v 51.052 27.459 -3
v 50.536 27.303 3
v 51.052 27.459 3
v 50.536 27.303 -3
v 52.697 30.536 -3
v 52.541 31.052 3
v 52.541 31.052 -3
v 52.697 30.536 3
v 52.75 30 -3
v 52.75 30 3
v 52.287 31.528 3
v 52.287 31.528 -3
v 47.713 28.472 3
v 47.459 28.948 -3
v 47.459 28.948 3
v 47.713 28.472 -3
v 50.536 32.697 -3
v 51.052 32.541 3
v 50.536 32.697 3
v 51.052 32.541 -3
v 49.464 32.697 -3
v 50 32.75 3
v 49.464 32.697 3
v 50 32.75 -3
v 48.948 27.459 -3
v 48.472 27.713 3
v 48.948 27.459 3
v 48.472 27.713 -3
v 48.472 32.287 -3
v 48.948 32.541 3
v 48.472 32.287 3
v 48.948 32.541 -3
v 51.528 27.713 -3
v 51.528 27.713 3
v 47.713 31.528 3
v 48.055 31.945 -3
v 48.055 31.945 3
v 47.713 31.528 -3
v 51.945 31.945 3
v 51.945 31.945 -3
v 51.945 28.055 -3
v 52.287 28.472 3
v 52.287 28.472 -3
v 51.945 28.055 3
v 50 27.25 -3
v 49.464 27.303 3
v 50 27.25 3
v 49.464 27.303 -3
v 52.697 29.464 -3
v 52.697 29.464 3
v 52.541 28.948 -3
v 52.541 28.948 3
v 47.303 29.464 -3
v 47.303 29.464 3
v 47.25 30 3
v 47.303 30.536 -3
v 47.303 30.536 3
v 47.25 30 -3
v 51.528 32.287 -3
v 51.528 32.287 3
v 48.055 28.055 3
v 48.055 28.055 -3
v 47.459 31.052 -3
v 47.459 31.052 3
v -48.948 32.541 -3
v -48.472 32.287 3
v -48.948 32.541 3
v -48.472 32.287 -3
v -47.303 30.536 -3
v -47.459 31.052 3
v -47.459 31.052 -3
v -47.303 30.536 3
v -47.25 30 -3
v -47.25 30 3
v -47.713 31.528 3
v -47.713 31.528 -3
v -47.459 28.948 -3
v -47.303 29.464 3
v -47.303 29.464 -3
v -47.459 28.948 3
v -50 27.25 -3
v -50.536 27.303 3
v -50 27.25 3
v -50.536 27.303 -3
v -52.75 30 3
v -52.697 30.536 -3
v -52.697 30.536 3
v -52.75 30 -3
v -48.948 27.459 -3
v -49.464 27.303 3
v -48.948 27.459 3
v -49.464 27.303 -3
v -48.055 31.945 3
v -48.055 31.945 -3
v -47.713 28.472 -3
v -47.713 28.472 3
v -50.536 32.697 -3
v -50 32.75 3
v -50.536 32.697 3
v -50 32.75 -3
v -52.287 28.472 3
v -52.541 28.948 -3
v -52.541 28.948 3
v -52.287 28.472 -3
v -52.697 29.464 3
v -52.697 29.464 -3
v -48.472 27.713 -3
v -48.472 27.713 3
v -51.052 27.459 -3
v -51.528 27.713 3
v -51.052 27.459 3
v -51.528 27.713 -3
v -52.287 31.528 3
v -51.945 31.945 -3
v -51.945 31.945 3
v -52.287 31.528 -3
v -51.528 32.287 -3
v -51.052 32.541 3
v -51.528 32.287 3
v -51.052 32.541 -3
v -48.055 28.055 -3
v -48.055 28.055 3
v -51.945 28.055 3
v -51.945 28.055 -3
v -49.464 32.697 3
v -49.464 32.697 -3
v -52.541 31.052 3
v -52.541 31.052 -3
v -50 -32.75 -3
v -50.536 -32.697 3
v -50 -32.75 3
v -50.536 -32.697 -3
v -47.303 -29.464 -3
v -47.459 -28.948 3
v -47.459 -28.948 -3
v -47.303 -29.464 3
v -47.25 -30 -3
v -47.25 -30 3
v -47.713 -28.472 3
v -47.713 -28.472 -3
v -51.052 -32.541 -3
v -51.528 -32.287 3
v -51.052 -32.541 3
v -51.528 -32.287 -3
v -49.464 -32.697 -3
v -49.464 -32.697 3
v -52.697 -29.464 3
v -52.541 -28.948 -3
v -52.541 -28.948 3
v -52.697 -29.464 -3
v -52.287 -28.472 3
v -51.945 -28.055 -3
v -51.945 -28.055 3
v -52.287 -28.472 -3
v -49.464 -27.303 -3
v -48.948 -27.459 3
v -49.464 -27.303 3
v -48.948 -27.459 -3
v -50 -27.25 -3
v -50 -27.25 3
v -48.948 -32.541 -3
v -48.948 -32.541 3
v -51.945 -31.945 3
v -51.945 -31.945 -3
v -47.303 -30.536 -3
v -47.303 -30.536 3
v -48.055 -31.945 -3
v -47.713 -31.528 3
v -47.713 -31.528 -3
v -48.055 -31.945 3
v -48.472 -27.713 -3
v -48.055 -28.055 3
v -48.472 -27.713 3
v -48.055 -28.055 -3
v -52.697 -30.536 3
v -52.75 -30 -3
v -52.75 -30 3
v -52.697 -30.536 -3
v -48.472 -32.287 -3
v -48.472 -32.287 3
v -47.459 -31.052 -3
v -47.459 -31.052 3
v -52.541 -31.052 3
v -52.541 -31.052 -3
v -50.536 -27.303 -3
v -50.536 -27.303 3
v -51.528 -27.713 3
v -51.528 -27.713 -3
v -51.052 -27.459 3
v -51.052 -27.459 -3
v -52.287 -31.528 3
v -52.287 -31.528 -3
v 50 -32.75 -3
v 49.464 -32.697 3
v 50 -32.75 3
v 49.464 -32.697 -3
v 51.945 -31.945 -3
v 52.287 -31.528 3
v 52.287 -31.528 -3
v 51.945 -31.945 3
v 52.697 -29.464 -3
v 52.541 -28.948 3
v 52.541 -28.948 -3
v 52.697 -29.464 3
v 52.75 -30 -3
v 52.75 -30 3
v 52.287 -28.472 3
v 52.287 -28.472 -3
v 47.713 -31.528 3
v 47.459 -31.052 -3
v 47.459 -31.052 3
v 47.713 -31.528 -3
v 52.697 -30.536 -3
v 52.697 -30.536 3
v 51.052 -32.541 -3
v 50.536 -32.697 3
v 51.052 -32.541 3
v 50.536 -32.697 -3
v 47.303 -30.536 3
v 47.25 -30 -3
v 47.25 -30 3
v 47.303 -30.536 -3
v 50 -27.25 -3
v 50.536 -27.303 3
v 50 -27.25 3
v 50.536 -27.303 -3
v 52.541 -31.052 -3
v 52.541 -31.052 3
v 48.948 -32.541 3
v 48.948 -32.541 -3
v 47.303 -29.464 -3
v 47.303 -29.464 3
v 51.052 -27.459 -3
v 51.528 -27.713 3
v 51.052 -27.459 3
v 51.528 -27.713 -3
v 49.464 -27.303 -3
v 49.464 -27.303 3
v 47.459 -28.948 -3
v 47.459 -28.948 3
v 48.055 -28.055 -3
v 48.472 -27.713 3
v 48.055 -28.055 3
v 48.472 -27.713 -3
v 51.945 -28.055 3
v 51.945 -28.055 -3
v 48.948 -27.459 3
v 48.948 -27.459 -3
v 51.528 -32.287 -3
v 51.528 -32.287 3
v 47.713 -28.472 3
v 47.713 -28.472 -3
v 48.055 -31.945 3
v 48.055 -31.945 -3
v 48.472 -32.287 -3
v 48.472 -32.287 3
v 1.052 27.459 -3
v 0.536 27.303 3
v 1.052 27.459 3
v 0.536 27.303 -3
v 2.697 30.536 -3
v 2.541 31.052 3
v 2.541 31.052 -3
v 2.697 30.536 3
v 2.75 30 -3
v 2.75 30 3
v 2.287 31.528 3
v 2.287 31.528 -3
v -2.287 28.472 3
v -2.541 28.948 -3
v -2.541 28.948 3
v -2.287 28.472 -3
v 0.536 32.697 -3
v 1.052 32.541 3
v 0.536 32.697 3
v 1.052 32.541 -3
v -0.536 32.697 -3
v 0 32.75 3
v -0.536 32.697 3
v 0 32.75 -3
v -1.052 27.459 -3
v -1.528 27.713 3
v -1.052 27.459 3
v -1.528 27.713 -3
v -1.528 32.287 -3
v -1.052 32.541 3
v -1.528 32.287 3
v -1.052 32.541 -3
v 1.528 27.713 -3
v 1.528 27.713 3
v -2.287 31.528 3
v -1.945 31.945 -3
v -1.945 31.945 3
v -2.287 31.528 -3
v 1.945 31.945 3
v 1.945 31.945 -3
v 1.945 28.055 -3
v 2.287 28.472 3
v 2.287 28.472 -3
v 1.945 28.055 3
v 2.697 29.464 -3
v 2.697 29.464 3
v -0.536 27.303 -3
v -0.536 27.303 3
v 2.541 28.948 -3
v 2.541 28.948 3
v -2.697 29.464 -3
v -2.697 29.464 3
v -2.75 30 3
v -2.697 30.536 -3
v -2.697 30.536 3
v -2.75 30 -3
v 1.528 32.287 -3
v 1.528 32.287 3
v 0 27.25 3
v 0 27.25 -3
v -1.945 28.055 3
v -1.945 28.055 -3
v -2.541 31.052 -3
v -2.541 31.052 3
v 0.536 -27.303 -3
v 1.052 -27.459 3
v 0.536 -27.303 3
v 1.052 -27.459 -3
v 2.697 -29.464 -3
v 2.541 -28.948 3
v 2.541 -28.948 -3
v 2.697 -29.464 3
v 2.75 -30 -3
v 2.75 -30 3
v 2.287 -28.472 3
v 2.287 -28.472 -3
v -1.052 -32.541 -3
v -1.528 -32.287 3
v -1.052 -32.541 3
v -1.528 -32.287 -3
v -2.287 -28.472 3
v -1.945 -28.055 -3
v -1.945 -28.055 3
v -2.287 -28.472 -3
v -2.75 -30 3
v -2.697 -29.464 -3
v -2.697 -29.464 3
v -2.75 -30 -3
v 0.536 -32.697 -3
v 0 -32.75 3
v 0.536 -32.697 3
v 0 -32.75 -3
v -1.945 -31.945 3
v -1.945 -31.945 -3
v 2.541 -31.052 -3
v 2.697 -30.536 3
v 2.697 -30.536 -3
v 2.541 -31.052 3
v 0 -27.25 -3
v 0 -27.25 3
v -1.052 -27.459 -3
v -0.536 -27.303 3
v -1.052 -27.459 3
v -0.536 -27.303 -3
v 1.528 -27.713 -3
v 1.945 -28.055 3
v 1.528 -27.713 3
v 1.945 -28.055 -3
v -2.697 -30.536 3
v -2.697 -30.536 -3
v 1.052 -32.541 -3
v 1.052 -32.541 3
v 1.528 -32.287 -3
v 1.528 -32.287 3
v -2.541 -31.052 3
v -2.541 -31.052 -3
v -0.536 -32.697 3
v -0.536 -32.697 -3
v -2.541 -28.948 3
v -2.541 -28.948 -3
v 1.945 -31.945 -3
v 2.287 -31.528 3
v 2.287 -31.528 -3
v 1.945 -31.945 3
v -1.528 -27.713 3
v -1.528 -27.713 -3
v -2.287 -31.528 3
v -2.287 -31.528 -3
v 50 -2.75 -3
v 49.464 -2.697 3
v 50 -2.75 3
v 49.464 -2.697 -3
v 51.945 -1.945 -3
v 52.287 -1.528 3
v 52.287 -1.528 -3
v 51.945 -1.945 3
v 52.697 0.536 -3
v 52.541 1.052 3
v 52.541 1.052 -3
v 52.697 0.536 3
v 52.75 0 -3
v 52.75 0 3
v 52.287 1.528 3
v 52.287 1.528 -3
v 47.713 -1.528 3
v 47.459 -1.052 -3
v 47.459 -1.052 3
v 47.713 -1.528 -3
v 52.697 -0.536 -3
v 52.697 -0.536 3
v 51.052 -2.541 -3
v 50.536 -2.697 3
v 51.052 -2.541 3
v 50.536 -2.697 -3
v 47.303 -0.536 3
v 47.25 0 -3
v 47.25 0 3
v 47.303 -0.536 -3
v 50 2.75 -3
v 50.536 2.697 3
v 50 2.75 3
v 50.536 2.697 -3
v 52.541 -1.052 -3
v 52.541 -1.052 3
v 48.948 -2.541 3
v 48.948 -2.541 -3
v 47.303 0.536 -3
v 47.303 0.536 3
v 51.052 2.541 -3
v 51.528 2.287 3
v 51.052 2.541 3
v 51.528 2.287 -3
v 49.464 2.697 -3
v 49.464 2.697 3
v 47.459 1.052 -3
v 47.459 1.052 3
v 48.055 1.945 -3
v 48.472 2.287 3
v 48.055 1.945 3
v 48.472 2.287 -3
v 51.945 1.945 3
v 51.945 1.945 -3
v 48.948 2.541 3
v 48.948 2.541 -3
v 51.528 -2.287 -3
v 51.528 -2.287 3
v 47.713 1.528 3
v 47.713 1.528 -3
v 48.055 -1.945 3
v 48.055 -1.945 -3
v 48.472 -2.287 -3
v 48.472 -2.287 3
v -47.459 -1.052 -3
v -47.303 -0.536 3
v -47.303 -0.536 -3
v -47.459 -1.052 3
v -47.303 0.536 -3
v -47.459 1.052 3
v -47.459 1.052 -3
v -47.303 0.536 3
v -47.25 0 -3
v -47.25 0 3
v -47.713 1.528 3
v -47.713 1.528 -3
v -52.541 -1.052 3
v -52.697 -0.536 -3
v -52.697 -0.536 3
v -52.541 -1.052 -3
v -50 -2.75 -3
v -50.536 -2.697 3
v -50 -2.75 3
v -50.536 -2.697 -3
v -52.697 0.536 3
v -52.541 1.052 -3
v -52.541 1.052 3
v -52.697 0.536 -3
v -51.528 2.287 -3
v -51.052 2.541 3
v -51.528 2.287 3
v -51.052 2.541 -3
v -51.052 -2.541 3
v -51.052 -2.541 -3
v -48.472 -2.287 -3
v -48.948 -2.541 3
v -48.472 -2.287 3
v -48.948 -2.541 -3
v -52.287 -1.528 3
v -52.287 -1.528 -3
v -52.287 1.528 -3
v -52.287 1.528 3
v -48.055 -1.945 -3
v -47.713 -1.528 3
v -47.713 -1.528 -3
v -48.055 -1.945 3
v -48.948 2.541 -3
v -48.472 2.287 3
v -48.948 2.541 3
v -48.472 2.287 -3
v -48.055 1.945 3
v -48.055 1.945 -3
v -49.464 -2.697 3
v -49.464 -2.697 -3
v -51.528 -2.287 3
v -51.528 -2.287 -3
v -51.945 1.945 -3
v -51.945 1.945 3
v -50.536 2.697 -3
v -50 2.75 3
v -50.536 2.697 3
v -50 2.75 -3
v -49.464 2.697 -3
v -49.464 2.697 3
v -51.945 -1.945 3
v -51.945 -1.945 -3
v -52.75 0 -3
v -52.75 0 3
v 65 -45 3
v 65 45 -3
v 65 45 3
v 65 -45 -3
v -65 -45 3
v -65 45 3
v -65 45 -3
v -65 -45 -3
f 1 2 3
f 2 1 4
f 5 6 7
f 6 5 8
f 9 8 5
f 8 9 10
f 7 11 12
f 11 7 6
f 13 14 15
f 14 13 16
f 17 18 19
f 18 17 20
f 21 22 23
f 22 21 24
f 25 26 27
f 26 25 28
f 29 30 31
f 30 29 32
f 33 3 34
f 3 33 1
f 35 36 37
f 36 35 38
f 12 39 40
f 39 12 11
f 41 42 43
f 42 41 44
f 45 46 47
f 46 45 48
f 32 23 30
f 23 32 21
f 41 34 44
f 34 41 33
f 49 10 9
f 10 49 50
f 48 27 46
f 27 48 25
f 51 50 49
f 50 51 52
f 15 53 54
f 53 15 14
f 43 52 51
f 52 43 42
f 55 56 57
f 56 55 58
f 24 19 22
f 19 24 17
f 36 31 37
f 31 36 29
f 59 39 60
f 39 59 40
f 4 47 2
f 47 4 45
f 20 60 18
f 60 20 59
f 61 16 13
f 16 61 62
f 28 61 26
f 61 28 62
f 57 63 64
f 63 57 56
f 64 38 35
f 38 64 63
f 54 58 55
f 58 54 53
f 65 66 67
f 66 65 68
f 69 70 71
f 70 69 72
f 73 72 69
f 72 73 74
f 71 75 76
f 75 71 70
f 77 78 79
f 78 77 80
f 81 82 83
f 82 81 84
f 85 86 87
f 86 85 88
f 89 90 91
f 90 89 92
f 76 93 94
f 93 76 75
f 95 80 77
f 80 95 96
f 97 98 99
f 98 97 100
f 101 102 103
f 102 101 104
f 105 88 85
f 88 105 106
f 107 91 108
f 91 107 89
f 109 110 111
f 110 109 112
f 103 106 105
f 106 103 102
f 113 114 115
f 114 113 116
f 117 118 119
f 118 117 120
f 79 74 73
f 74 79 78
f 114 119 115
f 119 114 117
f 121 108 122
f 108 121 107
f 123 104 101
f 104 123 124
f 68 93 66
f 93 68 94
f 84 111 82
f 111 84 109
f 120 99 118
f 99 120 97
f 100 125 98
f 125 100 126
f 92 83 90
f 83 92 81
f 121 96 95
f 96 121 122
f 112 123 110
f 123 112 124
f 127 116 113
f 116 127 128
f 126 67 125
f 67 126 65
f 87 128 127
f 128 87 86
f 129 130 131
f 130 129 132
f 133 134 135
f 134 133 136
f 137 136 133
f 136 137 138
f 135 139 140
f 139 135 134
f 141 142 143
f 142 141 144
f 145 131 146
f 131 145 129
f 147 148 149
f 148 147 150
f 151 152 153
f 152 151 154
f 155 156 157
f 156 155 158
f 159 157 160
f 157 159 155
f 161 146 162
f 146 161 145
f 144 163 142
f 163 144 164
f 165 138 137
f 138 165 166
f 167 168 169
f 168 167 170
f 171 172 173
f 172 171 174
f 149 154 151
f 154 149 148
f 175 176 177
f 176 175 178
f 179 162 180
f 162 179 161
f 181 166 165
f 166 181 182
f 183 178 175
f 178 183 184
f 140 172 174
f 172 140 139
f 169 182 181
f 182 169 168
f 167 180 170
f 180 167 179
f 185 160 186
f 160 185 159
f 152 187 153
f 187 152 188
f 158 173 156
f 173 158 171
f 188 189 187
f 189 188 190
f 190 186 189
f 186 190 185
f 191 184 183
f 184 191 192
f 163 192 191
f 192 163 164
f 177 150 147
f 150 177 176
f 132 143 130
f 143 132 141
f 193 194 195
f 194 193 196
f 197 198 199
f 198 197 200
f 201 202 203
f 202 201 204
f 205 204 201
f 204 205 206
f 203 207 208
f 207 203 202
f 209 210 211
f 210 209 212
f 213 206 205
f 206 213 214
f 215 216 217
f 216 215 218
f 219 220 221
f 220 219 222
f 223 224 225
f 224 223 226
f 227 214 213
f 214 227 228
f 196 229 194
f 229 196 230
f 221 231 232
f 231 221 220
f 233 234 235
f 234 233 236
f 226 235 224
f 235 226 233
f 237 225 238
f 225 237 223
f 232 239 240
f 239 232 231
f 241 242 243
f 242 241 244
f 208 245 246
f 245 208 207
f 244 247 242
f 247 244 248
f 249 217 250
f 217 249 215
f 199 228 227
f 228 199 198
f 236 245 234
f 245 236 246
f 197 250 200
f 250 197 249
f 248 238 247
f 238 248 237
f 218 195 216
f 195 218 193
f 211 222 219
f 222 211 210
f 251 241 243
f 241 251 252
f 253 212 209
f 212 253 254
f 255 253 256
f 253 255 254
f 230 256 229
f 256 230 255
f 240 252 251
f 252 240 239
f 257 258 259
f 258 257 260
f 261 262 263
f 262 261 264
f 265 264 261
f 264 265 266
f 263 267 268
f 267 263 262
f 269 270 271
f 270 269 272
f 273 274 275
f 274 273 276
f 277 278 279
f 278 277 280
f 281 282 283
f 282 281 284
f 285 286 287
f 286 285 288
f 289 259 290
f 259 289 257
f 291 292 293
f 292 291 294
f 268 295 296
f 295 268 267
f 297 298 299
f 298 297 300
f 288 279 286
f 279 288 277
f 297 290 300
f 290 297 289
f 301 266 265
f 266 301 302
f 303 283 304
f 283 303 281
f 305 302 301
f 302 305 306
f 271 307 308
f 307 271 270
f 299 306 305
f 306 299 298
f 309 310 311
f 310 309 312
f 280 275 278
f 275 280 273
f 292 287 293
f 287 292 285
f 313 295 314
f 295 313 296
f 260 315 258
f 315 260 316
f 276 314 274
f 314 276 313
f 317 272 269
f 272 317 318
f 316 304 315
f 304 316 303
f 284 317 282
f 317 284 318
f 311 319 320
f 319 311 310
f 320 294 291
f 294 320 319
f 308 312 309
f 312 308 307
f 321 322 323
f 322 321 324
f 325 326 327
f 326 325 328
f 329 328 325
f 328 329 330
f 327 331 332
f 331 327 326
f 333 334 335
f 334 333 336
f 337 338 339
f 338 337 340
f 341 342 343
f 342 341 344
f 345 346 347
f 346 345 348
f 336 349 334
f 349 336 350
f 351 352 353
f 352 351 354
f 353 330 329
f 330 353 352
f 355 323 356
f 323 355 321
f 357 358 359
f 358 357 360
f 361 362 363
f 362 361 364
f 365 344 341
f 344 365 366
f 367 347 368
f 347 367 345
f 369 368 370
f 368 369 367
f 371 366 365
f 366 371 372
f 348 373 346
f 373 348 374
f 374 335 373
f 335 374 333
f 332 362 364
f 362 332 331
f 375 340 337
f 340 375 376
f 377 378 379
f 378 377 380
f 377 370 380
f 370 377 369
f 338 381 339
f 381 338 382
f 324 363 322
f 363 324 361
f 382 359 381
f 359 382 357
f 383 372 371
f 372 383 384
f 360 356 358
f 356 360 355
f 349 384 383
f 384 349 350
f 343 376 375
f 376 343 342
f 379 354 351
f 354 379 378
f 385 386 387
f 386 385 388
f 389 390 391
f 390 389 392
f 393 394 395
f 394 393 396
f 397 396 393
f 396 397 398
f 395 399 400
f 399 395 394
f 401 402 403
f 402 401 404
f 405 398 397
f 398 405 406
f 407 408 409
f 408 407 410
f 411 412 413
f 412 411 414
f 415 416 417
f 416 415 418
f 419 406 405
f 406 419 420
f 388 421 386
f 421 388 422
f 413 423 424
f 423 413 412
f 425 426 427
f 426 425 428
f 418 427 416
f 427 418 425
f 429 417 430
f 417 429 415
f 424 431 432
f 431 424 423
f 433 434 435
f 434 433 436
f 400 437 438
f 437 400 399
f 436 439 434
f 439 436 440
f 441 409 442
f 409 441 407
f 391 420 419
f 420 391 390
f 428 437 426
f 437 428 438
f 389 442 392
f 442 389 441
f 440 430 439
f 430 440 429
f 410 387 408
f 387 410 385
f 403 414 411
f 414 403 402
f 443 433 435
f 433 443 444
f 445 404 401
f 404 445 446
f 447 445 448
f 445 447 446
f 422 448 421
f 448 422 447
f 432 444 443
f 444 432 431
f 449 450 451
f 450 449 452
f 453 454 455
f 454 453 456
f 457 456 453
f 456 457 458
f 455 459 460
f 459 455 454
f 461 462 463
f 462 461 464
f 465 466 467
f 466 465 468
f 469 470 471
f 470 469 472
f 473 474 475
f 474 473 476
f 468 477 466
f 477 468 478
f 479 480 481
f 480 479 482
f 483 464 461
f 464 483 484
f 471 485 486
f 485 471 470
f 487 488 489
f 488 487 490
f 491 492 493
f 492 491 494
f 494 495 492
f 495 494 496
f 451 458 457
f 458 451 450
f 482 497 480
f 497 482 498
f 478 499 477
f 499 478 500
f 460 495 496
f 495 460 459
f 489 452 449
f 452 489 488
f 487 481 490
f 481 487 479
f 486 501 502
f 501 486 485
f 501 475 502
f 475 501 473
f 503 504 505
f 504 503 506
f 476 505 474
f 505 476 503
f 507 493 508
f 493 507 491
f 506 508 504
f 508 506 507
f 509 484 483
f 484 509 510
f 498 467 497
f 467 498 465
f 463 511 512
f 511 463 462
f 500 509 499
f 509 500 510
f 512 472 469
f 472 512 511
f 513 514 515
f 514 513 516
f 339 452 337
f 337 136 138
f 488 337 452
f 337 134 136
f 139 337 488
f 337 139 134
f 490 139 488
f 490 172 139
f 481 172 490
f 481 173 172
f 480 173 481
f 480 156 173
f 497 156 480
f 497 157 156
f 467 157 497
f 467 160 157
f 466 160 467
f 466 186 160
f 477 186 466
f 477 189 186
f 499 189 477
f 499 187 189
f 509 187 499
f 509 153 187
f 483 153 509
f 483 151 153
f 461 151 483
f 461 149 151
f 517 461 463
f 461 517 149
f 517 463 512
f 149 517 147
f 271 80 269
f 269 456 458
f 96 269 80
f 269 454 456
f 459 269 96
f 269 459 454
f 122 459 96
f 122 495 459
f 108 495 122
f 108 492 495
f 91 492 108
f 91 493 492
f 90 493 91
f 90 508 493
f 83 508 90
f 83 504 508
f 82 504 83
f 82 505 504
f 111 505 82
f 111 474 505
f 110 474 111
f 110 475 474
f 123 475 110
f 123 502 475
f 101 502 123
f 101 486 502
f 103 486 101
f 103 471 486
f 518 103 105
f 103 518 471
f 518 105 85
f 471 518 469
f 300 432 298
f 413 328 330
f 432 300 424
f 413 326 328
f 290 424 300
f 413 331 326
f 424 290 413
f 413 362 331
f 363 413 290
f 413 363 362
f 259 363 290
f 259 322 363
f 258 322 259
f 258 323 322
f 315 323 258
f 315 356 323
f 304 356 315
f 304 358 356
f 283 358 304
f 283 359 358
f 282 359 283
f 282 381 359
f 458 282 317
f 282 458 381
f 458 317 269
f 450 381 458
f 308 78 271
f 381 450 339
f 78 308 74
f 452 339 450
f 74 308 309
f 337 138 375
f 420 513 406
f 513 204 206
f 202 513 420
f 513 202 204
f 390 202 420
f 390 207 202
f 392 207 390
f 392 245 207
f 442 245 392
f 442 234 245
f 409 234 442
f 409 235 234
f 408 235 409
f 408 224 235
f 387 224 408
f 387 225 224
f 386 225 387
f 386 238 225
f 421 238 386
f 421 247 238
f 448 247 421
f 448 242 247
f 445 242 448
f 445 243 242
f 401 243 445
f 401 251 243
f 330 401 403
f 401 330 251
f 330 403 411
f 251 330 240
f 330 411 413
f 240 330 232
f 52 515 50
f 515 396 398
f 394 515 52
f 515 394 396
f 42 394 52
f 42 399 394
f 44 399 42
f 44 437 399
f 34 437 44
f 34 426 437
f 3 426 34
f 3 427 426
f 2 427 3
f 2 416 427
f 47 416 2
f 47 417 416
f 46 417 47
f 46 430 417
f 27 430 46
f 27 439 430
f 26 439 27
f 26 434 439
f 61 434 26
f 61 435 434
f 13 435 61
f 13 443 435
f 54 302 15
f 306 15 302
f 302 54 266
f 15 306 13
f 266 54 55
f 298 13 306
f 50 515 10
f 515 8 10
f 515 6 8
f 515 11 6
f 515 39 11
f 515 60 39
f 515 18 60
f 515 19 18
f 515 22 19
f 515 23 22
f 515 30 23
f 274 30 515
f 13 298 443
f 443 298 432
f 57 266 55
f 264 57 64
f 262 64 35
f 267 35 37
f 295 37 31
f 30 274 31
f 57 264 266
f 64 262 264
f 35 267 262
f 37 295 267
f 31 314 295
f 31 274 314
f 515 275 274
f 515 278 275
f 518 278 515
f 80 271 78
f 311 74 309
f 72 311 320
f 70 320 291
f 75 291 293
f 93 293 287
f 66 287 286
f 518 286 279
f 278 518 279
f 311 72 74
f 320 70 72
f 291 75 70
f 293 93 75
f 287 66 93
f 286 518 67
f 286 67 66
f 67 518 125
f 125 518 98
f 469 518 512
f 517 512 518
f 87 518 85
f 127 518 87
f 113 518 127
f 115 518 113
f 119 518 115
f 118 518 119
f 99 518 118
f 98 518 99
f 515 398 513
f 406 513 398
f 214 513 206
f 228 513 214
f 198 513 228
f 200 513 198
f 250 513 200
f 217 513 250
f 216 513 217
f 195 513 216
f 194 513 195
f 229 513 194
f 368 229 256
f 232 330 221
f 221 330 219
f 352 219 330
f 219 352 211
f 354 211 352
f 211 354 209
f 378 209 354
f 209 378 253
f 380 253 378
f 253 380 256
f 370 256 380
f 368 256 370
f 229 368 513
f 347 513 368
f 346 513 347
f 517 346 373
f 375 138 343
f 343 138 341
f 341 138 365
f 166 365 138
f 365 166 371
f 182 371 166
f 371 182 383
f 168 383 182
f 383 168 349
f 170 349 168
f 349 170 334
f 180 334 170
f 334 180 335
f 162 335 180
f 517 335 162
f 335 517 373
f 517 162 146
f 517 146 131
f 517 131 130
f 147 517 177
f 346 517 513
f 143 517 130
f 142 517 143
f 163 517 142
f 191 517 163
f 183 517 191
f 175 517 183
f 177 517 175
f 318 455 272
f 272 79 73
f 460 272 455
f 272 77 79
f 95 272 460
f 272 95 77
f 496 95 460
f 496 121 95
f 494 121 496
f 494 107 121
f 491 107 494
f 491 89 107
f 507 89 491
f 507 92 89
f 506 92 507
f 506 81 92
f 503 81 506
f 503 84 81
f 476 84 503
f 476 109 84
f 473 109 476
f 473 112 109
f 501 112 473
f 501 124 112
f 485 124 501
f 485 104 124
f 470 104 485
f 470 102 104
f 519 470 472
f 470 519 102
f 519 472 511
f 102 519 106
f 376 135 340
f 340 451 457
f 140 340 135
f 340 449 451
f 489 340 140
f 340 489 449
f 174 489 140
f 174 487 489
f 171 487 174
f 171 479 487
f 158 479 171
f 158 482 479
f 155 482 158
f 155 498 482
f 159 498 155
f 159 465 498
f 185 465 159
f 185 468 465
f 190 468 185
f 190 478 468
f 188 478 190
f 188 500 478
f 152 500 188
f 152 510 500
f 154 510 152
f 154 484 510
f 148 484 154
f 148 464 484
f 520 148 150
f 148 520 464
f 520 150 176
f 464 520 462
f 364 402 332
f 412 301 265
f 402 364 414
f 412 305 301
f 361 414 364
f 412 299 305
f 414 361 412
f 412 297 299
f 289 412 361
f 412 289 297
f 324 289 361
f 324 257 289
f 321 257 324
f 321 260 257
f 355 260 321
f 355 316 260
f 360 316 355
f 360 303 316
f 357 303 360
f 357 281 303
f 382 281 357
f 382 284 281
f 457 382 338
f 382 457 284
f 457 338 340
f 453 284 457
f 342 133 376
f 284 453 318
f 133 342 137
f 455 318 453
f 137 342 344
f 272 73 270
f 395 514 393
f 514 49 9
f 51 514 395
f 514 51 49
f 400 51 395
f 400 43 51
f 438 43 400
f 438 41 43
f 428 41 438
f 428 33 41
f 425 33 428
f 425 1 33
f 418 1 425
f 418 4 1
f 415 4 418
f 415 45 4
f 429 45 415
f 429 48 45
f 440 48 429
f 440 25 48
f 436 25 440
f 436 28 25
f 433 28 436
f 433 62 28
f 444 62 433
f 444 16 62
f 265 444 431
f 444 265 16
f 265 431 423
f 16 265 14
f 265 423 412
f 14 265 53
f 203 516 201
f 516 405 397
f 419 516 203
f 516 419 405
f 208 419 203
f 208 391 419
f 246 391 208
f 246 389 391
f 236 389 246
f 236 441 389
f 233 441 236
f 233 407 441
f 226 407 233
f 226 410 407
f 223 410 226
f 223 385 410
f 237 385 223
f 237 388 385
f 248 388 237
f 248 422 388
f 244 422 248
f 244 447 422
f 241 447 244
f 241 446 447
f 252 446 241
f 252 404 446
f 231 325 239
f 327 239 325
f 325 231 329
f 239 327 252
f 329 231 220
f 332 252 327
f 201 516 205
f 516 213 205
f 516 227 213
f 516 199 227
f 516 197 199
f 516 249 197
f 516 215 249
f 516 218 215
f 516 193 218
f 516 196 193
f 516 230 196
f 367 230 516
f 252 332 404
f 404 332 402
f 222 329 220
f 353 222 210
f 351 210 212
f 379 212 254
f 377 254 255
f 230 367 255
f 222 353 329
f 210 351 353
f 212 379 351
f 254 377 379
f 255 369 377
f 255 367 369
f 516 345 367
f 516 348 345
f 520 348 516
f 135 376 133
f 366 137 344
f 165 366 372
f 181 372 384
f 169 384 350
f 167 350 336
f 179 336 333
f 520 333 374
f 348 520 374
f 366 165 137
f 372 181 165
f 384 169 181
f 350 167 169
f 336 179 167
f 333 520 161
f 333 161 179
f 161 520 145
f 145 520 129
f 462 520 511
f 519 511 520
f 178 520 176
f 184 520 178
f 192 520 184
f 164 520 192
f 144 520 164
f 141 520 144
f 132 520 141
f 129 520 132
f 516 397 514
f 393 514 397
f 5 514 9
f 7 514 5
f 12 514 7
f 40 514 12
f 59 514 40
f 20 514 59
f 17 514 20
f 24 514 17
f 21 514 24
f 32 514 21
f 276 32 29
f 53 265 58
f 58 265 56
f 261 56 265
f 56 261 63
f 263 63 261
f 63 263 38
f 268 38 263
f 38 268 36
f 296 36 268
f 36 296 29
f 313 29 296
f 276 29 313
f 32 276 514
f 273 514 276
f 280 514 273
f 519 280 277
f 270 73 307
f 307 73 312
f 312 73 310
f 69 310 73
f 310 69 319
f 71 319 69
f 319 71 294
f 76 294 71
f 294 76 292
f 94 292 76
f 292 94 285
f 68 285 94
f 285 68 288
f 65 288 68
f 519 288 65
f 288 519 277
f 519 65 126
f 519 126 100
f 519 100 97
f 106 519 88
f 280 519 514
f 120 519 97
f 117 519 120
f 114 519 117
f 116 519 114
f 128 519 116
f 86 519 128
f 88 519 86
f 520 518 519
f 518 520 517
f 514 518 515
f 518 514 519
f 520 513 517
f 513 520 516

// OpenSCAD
$fn = 32;

// ----------------------------------------------------------------------
// Corner plate 130 x 90 x 6
// 8 holes, centres taken from the edge offset
// ----------------------------------------------------------------------

// --- parameters (mm) ---
plate = [130, 90, 6];  // overall size (x, y, z)
seat_tol = 0.1;        // tolerance at the seating features
free_tol = 0.5;        // general tolerance on the free sizes
holes = 8;             // number of holes the drawing asks for
hole_d = 5.5;          // hole diameter
edge = 15;             // hole centre offset from the plate edge

// --- derived feature positions (mm) ---
corner_x = plate[0] / 2 - edge;  // = 50   corner hole X
corner_y = plate[1] / 2 - edge;  // = 30   corner hole Y
feature_centers = [
  [corner_x, corner_y],
  [-corner_x, corner_y],
  [-corner_x, -corner_y],
  [corner_x, -corner_y],
  [0, corner_y],
  [0, -corner_y],
  [corner_x, 0],
  [-corner_x, 0]
];   // hole centres the loop below drills

// plate outline, every hole drilled through with the same cutters
difference() {
  cube(plate, center = true);
  for (centre = feature_centers)
    translate([centre[0], centre[1], 0])
      cylinder(d = hole_d, h = plate[2] + 2, center = true);
}
